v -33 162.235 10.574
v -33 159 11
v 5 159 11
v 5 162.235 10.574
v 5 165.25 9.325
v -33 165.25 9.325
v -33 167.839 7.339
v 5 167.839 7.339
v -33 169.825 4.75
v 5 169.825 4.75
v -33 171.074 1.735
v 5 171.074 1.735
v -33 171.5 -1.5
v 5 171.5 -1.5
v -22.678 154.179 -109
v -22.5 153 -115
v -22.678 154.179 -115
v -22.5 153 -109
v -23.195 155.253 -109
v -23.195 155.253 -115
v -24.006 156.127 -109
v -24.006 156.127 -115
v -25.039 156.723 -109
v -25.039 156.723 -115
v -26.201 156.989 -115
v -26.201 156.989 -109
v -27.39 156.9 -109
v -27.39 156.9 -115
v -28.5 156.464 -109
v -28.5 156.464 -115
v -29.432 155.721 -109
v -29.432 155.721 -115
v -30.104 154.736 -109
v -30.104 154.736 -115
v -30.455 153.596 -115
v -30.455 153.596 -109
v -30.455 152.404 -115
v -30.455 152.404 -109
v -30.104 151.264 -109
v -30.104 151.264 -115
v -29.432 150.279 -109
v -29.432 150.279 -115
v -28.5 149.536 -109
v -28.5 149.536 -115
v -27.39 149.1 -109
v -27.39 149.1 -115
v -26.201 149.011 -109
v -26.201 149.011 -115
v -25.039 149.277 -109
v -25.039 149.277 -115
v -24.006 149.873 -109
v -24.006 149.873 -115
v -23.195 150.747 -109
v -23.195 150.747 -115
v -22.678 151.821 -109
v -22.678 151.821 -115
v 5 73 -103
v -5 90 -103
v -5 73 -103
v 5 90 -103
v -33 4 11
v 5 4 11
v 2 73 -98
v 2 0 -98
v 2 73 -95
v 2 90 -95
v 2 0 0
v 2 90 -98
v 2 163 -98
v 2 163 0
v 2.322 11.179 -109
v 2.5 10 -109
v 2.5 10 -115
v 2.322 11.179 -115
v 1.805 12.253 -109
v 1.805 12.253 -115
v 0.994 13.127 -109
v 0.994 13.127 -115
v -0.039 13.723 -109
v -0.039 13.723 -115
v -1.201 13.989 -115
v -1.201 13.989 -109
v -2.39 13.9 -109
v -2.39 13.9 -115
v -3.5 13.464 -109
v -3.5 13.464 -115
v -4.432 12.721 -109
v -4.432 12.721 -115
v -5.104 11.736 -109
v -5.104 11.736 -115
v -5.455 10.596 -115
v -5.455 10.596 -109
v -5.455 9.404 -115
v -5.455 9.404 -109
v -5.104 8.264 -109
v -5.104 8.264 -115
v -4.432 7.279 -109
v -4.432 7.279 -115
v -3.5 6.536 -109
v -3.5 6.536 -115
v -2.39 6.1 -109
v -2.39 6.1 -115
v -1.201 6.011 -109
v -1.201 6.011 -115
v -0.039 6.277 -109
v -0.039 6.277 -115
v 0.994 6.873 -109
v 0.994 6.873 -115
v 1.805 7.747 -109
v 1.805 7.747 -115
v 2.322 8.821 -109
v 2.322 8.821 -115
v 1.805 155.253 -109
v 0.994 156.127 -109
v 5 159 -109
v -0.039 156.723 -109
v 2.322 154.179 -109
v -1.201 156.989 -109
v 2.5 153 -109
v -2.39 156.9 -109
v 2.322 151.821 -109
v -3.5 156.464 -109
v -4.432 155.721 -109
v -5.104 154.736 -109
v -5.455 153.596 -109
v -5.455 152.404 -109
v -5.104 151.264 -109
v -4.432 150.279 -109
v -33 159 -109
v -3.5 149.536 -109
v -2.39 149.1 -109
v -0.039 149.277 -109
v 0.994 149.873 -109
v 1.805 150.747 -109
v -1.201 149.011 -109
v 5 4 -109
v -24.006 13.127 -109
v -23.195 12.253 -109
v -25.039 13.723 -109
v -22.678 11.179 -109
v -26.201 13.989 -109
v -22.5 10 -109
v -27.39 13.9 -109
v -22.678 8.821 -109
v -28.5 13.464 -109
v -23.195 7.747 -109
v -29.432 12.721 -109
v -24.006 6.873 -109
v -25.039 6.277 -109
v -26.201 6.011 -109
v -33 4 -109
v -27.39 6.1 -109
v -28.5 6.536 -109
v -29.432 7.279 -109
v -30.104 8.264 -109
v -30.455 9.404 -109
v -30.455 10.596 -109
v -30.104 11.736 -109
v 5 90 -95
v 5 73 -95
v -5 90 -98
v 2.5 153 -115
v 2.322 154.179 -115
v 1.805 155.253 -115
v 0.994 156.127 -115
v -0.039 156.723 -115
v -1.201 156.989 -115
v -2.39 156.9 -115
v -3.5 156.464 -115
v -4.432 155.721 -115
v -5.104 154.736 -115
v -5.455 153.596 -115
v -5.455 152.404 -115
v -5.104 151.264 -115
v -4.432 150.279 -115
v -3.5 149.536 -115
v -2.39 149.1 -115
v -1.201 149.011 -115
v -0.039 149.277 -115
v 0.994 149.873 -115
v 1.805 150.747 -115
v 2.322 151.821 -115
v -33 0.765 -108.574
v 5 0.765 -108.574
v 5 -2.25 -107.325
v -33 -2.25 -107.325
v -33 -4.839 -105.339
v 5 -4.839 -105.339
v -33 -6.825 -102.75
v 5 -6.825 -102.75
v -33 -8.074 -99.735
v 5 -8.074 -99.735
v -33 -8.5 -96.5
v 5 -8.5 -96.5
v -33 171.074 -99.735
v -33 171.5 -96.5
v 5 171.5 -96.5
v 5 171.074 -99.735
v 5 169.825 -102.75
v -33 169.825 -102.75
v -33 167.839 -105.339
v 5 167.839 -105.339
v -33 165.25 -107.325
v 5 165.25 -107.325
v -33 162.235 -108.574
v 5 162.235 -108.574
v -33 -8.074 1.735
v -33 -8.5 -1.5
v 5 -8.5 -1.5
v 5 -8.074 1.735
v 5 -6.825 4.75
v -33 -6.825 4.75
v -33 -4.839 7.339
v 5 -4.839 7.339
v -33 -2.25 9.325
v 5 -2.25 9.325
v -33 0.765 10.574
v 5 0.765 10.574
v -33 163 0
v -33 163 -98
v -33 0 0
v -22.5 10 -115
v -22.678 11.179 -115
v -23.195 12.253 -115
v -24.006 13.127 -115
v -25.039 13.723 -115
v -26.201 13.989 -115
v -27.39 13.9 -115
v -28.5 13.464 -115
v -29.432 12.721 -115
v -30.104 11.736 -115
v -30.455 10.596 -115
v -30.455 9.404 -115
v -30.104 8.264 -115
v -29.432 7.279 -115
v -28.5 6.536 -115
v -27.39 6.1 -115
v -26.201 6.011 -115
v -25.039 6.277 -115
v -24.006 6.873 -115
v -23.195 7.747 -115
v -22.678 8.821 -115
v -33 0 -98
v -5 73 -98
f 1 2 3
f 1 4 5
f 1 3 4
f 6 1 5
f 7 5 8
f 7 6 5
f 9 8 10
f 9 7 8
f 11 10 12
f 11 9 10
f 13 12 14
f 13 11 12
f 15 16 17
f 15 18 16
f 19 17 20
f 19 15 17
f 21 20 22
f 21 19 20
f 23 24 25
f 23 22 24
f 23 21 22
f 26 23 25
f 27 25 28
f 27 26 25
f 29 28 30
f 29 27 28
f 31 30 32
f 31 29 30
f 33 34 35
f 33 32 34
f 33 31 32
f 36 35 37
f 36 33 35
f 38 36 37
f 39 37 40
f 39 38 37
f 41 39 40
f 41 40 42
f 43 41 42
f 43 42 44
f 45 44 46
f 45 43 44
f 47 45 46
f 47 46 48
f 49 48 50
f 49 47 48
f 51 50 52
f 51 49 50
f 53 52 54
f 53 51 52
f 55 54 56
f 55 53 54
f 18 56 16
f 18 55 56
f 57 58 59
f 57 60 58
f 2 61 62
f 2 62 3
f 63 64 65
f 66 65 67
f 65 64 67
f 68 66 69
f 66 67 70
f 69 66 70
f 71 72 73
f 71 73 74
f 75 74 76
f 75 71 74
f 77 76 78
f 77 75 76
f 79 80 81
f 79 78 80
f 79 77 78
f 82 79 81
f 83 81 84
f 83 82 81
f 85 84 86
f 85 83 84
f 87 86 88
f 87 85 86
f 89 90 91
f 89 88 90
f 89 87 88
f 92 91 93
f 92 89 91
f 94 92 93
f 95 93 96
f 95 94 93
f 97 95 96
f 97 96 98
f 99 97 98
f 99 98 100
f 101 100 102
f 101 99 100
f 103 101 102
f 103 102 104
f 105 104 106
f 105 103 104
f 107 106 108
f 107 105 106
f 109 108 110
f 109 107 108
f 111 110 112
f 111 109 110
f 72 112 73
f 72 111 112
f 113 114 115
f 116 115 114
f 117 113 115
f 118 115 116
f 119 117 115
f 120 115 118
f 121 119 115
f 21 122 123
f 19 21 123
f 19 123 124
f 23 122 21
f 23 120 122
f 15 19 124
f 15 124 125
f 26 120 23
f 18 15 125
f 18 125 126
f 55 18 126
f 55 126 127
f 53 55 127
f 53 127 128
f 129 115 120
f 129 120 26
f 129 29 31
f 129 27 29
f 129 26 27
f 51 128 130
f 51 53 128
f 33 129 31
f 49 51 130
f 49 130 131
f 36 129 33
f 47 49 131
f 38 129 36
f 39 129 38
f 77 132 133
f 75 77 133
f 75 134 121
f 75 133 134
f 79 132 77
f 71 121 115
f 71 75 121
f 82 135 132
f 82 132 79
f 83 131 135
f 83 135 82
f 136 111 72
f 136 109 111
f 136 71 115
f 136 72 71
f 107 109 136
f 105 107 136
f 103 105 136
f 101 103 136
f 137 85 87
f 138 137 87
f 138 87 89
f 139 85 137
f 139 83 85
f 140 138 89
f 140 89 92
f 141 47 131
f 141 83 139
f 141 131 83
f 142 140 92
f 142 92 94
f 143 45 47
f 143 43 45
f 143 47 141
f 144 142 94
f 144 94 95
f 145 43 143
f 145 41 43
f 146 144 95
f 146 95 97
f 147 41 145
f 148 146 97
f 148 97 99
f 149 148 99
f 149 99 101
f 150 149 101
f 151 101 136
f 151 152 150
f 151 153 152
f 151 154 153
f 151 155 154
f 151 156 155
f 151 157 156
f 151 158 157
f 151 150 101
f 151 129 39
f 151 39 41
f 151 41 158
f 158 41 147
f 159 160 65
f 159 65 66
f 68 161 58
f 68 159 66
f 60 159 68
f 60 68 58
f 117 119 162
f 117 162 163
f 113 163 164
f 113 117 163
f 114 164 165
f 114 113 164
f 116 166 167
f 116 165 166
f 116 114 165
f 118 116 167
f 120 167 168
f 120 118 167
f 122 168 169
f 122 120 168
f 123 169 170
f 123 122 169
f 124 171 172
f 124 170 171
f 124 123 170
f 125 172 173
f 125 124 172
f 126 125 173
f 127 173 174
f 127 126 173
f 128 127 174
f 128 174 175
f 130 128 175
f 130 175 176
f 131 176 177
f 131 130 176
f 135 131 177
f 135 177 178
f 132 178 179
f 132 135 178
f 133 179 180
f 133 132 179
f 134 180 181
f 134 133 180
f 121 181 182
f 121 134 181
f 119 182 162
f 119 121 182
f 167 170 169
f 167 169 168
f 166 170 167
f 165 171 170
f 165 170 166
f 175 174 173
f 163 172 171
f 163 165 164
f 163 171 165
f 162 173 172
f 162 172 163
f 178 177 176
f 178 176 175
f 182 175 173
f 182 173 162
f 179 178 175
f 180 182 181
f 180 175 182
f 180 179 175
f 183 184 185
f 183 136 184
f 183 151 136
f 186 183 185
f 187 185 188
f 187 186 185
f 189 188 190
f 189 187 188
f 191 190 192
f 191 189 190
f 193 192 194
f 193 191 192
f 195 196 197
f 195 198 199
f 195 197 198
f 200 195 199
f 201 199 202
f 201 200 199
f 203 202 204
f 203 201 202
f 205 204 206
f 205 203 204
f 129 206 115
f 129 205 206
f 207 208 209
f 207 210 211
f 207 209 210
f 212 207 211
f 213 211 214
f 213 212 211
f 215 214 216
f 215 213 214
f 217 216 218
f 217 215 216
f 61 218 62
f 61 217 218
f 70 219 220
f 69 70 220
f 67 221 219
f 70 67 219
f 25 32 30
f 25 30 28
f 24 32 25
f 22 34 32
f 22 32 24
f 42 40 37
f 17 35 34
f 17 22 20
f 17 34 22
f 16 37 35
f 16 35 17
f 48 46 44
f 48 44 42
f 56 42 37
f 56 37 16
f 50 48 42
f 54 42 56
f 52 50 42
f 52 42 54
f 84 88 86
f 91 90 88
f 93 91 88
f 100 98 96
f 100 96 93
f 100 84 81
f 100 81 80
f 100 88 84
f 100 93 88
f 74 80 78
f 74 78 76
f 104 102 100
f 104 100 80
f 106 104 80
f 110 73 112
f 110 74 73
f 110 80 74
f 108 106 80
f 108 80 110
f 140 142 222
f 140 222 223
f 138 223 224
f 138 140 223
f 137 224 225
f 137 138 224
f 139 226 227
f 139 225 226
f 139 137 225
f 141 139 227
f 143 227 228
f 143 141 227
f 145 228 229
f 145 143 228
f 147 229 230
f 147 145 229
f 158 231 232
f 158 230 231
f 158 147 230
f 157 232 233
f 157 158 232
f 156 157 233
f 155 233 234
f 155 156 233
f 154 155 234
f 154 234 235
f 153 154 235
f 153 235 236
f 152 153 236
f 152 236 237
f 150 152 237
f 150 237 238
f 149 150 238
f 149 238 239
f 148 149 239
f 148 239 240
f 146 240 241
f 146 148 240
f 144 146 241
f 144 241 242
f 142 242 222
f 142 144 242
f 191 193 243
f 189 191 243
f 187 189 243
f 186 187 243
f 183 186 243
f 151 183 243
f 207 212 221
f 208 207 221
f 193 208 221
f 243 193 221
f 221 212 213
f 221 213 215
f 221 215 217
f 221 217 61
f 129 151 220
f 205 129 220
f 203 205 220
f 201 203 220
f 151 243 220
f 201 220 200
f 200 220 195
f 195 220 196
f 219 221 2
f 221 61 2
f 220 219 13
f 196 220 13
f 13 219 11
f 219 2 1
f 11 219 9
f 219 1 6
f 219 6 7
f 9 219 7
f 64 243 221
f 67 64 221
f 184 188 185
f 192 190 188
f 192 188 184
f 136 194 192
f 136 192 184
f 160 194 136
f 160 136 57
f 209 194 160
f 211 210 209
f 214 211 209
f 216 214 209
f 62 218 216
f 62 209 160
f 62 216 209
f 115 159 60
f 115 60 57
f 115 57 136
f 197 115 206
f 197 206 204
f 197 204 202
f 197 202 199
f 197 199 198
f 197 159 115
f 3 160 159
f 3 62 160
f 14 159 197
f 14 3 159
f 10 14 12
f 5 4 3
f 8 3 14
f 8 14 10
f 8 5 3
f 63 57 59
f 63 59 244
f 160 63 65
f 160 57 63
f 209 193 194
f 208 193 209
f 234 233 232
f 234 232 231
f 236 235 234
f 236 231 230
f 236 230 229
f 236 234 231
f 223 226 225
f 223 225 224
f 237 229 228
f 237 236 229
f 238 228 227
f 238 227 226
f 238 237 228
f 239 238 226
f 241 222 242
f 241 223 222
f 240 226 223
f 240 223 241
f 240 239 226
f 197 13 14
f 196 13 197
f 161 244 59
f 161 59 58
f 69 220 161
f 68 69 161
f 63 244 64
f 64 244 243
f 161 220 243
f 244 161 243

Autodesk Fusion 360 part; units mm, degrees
sketch "Sketch1" plane through (0, 0, 0) normal (0, 0, 1) x (1, 0, 0)
sketch "Sketch2" plane through (0, 0, 0) normal (1, 0, 0) x (0, 1, 0)
  line L0 (4, 11) -> (159, 11)
  line L1 (171.5, -1.5) -> (171.5, -96.5)
  line L2 (159, -109) -> (4, -109)
  line L3 (-8.5, -96.5) -> (-8.5, -1.5)
  line L4 (0, 0) -> (163, 0)
  line L5 (163, 0) -> (163, -98)
  line L6 (163, -98) -> (0, -98)
  line L7 (0, -98) -> (0, 0)
  arc A0 (4, 11) -> (-8.5, -1.5) centre (4, -1.5) ccw
  arc A1 (171.5, -1.5) -> (159, 11) centre (159, -1.5) ccw
  arc A2 (159, -109) -> (171.5, -96.5) centre (159, -96.5) ccw
  arc A3 (-8.5, -96.5) -> (4, -109) centre (4, -96.5) ccw
  point P0 (-8.5, 11)
  point P1 (171.5, 11)
  point P2 (-8.5, -109)
  dimension "d1" = 120
  dimension "d2" = 180
  dimension "d3" = 98
  dimension "d4" = 163
  dimension "d5" = 11
  dimension "d6" = 8.5
  dimension "d13" = 12.5
extrude "Extrude1" add sketch "Sketch2" along normal blind 2
extrude "Extrude2" add 1 faces at (0, 107.3333, 3.6667) along direction (-1, 0, 0) blind 33
sketch "Sketch3" plane through (2, 0, 0) normal (1, 0, 0) x (0, 1, 0)
  line L0 (163, -98) -> (0, -98)
  line L1 (0, -98) -> (0, 0)
  line L2 (0, 0) -> (163, 0)
  line L3 (163, 0) -> (163, -98)
  line L4 (4, -109) -> (159, -109)
  line L5 (171.5, -96.5) -> (171.5, -1.5)
  line L6 (159, 11) -> (4, 11)
  line L7 (-8.5, -1.5) -> (-8.5, -96.5)
  line L8 (-8.5, -1.5) -> (159, -1.5)
  line L9 (159, -1.5) -> (159, -109)
  line L10 (159, -109) -> (-8.5, -109)
  line L11 (-8.5, -109) -> (-8.5, -1.5)
  arc A0 (4, 11) -> (-8.5, -1.5) centre (4, -1.5) ccw
  arc A1 (-8.5, -96.5) -> (4, -109) centre (4, -96.5) ccw
  arc A2 (159, -109) -> (171.5, -96.5) centre (159, -96.5) ccw
  arc A3 (171.5, -1.5) -> (159, 11) centre (159, -1.5) ccw
sketch "Sketch4" plane through (2, 0, 0) normal (1, 0, 0) x (0, 1, 0)
  line L0 (163, -98) -> (0, -98)
  line L1 (0, -98) -> (0, 0)
  line L2 (0, 0) -> (163, 0)
  line L3 (163, 0) -> (163, -98)
  arc A0 (4, 11) -> (-8.5, -1.5) centre (4, -1.5) ccw
  line L4 (-8.5, -1.5) -> (-8.5, -96.5)
  arc A1 (-8.5, -96.5) -> (4, -109) centre (4, -96.5) ccw
  line L5 (4, -109) -> (159, -109)
  arc A2 (159, -109) -> (171.5, -96.5) centre (159, -96.5) ccw
  line L6 (171.5, -96.5) -> (171.5, -1.5)
  arc A3 (171.5, -1.5) -> (159, 11) centre (159, -1.5) ccw
  line L7 (159, 11) -> (4, 11)
  line L8 (0, 0) -> (163, 0)
  line L9 (163, 0) -> (163, -98)
  line L10 (163, -98) -> (0, -98)
  line L11 (0, -98) -> (0, 0)
  line L12 (-10, 10) -> (-94.6711, 10)
  line L13 (-94.6711, 10) -> (-94.6711, 7.3388)
  line L14 (-94.6711, 7.3388) -> (-10, 7.3388)
  line L15 (-10, 7.3388) -> (-10, 10)
extrude "Extrude4" add sketch "Sketch4" along normal blind 3 contours L0 L1 L2 L3 L8 L9 L10 L11 | A0 L4 A1 L5 A2 L6 A3 L7
sketch "Sketch5" plane through (0, 0, -109) normal (0, 0, -1) x (1, 0, 0)
  line L0 (-33, -159) -> (5, -159)
  line L1 (5, -159) -> (5, -4)
  line L2 (5, -4) -> (-33, -4)
  line L3 (-33, -4) -> (-33, -159)
  circle A0 centre (-26.5, -10) radius 4
  circle A1 centre (-1.5, -10) radius 4
  circle A2 centre (-26.5, -153) radius 4
  circle A3 centre (-1.5, -153) radius 4
  dimension "d16" = 8
  dimension "d17" = 8
  dimension "d18" = 8
  dimension "d19" = 8
  dimension "d20" = 6
  dimension "d21" = 6
  dimension "d22" = 6
  dimension "d23" = 6
  dimension "d24" = 6.5
  dimension "d25" = 6.5
  dimension "d26" = 6.5
  dimension "d27" = 6.5
extrude "Extrude5" add sketch "Sketch5" along normal blind 6 contours A0 | A1 | A2 | A3
sketch "Sketch6" plane through (5, 0, 0) normal (1, 0, 0) x (0, 1, 0)
  line L0 (159, 11) -> (4, 11)
  arc A0 (4, 11) -> (-8.5, -1.5) centre (4, -1.5) ccw
  line L1 (-8.5, -1.5) -> (-8.5, -96.5)
  arc A1 (-8.5, -96.5) -> (4, -109) centre (4, -96.5) ccw
  line L2 (4, -109) -> (159, -109)
  arc A2 (159, -109) -> (171.5, -96.5) centre (159, -96.5) ccw
  line L3 (171.5, -96.5) -> (171.5, -1.5)
  arc A3 (171.5, -1.5) -> (159, 11) centre (159, -1.5) ccw
  line L4 (73, -95) -> (82, -95)
  line L5 (82, -103) -> (73, -103)
  line L6 (73, -95) -> (90, -95)
  line L7 (90, -95) -> (90, -103)
  line L8 (90, -103) -> (73, -103)
  line L9 (73, -103) -> (73, -95)
extrude "Extrude7" cut sketch "Sketch6" against normal blind 10 contours L4 L5 L6 L7 L8 L9
